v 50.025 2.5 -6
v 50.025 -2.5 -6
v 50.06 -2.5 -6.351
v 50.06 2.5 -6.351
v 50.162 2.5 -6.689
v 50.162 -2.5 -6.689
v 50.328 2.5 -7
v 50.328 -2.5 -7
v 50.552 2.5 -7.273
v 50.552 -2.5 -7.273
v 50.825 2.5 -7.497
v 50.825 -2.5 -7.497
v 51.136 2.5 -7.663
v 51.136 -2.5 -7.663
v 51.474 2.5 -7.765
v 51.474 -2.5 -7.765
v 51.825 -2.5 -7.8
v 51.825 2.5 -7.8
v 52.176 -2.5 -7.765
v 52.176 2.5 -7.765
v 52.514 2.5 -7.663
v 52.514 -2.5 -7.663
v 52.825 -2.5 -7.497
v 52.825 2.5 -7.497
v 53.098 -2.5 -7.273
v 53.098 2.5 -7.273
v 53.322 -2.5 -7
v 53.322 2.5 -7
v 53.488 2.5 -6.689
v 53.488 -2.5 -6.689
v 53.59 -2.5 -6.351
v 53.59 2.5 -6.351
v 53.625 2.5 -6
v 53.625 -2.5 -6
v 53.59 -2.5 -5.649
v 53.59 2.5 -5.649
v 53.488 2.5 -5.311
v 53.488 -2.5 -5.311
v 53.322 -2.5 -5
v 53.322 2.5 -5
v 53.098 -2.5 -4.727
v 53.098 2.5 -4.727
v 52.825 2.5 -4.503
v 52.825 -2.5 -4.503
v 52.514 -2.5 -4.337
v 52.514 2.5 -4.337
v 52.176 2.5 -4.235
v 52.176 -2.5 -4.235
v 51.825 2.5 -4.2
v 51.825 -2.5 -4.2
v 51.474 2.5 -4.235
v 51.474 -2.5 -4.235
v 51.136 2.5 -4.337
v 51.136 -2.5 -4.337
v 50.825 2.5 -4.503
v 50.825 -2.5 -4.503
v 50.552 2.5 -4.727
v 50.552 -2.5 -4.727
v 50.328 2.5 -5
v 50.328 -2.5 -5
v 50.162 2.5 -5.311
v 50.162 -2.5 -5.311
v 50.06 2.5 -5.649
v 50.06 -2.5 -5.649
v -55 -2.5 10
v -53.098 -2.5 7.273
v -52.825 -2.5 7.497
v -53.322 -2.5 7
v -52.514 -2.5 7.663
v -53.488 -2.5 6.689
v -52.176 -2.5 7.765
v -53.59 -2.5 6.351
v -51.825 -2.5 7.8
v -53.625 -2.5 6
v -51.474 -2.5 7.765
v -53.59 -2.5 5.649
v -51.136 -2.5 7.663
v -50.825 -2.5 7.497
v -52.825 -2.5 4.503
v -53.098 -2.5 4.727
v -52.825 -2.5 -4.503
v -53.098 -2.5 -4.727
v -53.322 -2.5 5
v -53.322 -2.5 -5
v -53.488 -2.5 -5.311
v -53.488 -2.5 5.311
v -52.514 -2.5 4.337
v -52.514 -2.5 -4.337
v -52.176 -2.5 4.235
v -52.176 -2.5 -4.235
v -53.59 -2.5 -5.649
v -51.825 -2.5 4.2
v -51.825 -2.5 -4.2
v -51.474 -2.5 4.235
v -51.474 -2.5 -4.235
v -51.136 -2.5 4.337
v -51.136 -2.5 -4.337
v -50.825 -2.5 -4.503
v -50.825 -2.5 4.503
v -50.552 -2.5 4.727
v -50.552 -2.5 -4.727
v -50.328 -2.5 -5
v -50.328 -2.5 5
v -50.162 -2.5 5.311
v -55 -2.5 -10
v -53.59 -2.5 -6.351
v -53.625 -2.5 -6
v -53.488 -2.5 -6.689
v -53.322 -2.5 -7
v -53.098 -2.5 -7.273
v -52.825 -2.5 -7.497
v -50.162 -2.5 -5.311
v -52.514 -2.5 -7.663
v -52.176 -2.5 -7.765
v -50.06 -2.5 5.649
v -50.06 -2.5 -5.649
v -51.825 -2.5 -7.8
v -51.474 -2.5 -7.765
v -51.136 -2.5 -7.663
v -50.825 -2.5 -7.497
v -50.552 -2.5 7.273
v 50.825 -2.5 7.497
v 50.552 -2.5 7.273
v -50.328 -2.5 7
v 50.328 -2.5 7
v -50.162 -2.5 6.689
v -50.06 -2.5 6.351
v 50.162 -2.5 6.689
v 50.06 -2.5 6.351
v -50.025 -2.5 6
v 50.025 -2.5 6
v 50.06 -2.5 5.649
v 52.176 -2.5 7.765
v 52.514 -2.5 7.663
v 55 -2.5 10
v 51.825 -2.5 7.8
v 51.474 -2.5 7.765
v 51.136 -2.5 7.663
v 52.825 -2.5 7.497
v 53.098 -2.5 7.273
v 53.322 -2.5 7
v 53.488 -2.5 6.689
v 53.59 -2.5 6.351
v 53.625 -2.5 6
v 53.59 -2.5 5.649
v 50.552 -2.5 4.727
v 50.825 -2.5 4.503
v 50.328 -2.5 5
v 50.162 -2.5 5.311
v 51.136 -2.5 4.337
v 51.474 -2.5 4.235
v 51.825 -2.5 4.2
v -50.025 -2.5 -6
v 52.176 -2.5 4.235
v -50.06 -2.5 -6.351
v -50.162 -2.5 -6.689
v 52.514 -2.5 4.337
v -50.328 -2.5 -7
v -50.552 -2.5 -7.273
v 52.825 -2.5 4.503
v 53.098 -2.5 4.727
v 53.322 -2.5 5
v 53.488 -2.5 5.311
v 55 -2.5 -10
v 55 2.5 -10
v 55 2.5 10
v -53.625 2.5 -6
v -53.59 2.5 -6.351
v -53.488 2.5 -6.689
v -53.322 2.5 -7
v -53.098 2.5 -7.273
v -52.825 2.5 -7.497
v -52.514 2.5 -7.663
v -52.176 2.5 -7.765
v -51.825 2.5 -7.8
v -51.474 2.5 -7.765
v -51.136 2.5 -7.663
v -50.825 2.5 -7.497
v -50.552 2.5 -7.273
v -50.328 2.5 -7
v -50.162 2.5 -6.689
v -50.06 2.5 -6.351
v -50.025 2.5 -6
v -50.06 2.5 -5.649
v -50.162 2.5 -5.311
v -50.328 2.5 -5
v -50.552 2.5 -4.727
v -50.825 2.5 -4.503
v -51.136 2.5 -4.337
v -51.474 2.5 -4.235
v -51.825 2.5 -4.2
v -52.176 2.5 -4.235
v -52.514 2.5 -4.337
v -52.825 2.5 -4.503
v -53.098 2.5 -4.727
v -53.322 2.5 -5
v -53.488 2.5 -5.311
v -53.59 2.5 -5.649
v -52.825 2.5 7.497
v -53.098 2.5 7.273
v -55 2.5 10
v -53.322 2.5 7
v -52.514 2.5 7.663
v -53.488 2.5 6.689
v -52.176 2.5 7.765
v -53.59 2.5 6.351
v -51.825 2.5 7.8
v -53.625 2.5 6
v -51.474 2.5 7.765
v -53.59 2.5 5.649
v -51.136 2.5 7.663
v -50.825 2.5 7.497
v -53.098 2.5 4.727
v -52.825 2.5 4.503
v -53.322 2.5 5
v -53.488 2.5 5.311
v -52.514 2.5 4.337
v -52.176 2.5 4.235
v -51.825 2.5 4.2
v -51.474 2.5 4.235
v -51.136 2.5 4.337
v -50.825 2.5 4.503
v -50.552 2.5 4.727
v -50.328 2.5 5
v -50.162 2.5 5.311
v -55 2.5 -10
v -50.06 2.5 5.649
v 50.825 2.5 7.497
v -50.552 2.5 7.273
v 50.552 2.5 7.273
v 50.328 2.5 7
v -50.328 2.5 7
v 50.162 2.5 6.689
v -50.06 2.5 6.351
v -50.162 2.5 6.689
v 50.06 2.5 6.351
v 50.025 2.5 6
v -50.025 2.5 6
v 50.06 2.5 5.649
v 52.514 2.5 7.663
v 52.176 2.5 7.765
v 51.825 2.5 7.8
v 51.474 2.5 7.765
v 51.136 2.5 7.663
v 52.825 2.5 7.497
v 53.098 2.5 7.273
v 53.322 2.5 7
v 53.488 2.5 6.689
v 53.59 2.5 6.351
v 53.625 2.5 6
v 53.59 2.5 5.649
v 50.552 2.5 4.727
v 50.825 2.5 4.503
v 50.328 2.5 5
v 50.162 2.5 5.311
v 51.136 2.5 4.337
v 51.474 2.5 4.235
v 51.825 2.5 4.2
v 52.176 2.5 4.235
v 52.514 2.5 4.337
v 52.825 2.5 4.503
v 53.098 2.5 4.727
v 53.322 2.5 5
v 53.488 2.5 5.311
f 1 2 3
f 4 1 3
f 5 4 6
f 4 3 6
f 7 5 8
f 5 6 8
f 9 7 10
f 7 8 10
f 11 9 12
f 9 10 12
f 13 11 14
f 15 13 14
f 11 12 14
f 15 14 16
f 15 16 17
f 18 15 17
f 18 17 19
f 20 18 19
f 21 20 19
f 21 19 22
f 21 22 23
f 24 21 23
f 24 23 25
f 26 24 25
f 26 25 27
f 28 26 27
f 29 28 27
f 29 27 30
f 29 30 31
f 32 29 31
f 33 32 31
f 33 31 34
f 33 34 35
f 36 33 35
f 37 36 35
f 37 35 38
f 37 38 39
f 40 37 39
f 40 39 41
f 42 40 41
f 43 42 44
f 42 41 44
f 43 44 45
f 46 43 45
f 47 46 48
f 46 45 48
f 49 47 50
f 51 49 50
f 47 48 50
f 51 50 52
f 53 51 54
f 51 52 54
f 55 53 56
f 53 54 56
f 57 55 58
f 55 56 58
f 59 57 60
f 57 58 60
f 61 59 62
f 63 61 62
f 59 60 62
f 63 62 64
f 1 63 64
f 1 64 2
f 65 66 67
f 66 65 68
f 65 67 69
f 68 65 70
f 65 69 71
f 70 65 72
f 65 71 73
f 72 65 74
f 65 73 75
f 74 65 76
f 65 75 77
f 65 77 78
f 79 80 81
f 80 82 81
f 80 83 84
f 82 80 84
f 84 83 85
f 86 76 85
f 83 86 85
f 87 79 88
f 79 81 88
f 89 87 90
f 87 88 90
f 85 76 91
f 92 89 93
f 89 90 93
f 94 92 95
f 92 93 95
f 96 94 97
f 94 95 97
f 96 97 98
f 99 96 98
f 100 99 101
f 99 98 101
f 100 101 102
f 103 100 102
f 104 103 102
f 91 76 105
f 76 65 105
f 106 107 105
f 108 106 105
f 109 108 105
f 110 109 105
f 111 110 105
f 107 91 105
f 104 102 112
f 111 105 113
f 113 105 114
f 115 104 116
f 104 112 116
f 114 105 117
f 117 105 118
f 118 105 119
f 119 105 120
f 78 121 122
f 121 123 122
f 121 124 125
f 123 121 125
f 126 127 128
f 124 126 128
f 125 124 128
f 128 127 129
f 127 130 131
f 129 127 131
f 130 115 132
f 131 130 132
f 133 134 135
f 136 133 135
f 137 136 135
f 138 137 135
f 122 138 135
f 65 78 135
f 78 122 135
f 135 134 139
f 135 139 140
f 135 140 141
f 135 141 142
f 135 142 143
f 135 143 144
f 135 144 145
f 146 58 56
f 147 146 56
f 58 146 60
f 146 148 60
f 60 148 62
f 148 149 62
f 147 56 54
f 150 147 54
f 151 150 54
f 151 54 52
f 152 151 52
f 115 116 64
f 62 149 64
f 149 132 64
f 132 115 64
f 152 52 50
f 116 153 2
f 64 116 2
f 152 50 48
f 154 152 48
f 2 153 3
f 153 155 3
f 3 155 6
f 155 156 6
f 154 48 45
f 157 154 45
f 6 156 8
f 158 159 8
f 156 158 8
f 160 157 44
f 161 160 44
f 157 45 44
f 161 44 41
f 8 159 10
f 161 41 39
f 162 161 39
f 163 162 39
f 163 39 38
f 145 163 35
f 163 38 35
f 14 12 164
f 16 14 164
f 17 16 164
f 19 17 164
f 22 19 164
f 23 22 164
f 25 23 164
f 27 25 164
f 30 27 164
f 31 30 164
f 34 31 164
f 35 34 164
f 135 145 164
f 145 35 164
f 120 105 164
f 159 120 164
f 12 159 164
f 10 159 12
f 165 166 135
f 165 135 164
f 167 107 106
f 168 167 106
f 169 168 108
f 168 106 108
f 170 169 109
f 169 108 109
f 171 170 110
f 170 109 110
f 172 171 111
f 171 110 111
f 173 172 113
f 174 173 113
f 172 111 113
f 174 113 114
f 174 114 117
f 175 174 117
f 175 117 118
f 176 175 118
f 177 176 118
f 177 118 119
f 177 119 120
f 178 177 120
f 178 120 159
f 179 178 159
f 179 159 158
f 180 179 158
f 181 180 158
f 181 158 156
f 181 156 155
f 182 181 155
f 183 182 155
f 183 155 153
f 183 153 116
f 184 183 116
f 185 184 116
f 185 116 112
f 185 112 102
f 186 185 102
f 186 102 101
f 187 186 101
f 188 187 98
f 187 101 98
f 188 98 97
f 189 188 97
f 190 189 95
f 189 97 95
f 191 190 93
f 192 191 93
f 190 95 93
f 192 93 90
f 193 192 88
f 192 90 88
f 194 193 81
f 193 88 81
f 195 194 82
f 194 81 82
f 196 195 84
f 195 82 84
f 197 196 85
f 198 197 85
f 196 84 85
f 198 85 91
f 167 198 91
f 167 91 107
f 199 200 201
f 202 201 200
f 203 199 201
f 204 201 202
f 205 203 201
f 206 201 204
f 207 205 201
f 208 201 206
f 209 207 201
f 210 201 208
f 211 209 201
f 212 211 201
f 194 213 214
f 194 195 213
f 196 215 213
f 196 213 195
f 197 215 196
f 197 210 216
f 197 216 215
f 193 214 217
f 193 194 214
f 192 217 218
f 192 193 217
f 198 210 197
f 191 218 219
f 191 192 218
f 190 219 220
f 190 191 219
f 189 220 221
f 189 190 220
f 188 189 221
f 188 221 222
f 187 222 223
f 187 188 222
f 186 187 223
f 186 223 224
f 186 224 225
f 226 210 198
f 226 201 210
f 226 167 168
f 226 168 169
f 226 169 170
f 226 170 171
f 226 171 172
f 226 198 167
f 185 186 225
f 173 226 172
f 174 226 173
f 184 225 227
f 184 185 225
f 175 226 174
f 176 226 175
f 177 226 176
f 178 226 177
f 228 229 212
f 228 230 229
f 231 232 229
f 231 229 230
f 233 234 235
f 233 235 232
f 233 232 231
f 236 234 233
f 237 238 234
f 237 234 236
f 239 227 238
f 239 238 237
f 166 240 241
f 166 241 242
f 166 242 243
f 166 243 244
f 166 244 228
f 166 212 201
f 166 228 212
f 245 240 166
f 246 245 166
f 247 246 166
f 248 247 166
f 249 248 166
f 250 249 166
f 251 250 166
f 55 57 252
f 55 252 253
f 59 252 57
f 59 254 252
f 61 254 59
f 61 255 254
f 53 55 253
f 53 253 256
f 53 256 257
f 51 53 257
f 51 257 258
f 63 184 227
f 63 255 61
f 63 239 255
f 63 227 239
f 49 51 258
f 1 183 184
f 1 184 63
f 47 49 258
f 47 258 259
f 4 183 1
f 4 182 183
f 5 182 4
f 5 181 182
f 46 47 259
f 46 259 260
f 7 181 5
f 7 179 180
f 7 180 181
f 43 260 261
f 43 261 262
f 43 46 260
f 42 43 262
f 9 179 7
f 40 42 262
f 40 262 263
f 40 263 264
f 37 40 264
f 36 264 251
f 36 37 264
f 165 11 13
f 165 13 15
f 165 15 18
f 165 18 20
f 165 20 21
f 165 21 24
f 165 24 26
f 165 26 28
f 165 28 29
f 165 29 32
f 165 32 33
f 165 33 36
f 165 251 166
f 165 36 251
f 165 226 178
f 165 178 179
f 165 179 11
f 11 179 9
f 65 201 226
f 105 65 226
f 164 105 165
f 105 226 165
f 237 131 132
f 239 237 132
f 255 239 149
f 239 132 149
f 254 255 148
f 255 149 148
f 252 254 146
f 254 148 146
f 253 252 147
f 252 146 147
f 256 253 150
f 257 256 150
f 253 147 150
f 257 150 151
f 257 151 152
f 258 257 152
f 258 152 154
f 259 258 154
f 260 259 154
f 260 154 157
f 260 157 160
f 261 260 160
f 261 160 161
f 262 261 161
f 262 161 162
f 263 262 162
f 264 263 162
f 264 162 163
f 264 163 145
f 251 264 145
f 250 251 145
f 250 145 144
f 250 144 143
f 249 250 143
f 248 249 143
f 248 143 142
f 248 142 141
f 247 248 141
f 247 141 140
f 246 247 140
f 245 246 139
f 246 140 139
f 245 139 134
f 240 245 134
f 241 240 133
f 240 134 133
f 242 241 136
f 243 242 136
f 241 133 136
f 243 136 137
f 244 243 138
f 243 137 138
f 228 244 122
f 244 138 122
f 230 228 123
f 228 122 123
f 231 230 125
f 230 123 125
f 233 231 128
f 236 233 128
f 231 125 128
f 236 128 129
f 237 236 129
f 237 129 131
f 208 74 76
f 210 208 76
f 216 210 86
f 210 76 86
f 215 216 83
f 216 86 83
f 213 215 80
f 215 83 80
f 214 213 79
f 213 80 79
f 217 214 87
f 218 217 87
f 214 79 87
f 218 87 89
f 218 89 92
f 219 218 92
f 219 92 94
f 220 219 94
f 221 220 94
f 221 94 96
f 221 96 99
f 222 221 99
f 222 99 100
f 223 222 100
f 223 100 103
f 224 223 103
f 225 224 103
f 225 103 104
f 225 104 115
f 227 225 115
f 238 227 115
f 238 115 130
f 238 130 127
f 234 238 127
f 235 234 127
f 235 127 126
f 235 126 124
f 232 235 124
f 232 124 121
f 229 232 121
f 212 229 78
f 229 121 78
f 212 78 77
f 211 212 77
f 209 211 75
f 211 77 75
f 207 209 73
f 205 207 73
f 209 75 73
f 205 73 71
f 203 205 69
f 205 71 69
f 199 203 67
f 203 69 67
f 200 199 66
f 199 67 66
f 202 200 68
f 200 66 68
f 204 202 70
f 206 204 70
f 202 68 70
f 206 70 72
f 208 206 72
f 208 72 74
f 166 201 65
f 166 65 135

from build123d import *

# Parameters (mm, degrees)
SKETCH1_W            = 110
SKETCH1_H            = 20
BOSS_EXTRUDE1_DEPTH  = 2.5
M3_CLEARANCE_HOLE1_D = 3.6


with BuildPart() as part:
    # Sketch1 → Boss-Extrude1 (new, symmetric)
    with BuildSketch(Plane(origin=(0, 0, 0), x_dir=(1, 0, 0), z_dir=(0, 1, 0))):
        Rectangle(SKETCH1_W, SKETCH1_H)
    extrude(amount=BOSS_EXTRUDE1_DEPTH, both=True)

    # M3 Clearance Hole1 (through all)
    with Locations(Plane(origin=(0, 2.5, 0), x_dir=(1, 0, 0), z_dir=(0, 1, 0))):
        with Locations((51.825, 6), (-51.825, -6), (51.825, -6), (-51.825, 6)):
            Hole(M3_CLEARANCE_HOLE1_D / 2)


solid = part.part
